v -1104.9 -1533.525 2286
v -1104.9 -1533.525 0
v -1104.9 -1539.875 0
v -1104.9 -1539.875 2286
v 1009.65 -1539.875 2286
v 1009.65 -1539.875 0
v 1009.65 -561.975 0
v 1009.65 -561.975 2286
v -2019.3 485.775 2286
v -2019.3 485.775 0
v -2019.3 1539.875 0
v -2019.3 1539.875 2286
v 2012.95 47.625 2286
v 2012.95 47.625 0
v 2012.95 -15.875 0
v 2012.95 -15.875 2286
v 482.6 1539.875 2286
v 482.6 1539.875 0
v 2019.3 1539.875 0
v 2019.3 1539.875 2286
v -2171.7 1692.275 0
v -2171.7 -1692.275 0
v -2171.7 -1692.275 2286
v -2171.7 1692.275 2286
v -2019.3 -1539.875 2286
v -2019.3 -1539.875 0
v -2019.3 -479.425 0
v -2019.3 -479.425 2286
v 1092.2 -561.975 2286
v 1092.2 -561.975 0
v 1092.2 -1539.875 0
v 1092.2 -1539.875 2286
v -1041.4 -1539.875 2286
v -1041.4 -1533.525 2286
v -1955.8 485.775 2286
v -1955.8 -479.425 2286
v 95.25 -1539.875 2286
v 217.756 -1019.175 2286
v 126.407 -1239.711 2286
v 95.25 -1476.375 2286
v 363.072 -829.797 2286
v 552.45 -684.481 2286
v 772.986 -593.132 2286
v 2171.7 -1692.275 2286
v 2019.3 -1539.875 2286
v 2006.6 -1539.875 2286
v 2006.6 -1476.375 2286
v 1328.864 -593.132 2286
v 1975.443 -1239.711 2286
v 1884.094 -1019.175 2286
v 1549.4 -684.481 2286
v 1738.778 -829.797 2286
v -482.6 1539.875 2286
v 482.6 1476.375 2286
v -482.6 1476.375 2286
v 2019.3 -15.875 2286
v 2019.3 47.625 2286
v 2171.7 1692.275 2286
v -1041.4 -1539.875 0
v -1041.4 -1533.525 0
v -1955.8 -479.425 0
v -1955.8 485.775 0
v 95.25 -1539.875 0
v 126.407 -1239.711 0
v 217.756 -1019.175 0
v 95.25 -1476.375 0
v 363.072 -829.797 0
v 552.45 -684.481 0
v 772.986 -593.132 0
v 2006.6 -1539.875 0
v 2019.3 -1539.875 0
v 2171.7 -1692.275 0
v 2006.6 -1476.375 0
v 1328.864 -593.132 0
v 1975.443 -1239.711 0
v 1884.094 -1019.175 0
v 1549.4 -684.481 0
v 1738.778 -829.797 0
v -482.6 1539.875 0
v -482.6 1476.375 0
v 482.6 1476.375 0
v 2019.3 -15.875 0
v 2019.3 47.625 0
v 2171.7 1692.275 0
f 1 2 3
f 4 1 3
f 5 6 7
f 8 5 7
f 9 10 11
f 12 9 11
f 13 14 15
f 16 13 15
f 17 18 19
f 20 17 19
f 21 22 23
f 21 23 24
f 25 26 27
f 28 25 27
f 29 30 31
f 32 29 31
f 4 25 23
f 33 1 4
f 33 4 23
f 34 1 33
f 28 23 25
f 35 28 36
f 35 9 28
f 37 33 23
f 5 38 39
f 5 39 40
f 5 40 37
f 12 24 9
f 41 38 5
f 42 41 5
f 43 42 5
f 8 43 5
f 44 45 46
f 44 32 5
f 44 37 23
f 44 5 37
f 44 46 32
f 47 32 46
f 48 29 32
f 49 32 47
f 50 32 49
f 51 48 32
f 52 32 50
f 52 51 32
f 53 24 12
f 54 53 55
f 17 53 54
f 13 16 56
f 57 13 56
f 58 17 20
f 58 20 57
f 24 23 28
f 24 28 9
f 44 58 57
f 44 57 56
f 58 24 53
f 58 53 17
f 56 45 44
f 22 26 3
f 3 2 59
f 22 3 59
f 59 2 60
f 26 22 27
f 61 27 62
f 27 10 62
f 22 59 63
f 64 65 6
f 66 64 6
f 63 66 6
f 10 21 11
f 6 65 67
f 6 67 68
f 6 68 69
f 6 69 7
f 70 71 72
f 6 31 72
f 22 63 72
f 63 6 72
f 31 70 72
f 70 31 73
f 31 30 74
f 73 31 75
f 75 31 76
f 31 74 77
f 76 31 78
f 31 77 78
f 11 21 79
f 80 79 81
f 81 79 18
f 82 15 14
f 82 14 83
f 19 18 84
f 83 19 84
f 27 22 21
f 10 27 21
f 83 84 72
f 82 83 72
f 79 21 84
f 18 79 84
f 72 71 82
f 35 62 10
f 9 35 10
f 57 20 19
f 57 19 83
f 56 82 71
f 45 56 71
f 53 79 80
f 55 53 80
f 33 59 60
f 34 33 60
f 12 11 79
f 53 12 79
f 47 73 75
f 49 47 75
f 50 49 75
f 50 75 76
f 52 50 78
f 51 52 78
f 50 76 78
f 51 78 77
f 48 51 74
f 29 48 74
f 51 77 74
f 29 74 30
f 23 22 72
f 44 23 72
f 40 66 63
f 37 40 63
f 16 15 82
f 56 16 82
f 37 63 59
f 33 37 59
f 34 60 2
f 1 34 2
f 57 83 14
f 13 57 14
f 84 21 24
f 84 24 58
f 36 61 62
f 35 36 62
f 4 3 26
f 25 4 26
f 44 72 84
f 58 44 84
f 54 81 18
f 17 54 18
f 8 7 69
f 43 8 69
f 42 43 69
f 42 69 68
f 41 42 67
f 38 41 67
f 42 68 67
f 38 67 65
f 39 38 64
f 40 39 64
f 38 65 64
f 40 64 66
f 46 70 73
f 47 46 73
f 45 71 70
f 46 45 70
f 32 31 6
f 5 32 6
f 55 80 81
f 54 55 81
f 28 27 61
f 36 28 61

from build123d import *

# Parameters (mm, degrees)
F0_W     = 4343.4
F0_H     = 3384.55
F1_DEPTH = 2286


with BuildPart() as f1:
    # F0 (on Top) → F1 (new body)
    with BuildSketch(Plane.XY):
        Rectangle(F0_W, F0_H)
        with BuildLine():
            Line((-2019.3, 485.775), (-2019.3, 1539.875))
            Line((-2019.3, 1539.875), (-482.6, 1539.875))
            Line((-482.6, 1539.875), (-482.6, 1476.375))
            Line((-482.6, 1476.375), (482.6, 1476.375))
            Line((482.6, 1476.375), (482.6, 1539.875))
            Line((482.6, 1539.875), (2019.3, 1539.875))
            Line((2019.3, 1539.875), (2019.3, 47.625))
            Line((2019.3, 47.625), (2012.95, 47.625))
            Line((2012.95, 47.625), (2012.95, -15.875))
            Line((2012.95, -15.875), (2019.3, -15.875))
            Line((2019.3, -15.875), (2019.3, -1539.875))
            Line((2019.3, -1539.875), (2006.6, -1539.875))
            Line((2006.6, -1539.875), (2006.6, -1476.375))
            ThreePointArc((2006.6, -1476.375), (1738.778441, -829.796559), (1092.2, -561.975))
            Line((1092.2, -561.975), (1092.2, -1476.375))
            Line((1092.2, -1476.375), (1092.2, -1539.875))
            Line((1092.2, -1539.875), (1009.65, -1539.875))
            Line((1009.65, -1539.875), (1009.65, -1476.375))
            Line((1009.65, -1476.375), (1009.65, -561.975))
            ThreePointArc((1009.65, -561.975), (363.071559, -829.796559), (95.25, -1476.375))
            Line((95.25, -1476.375), (95.25, -1539.875))
            Line((95.25, -1539.875), (-1041.4, -1539.875))
            Line((-1041.4, -1539.875), (-1041.4, -1533.525))
            Line((-1041.4, -1533.525), (-1104.9, -1533.525))
            Line((-1104.9, -1533.525), (-1104.9, -1539.875))
            Line((-1104.9, -1539.875), (-2019.3, -1539.875))
            Line((-2019.3, -1539.875), (-2019.3, -479.425))
            Line((-2019.3, -479.425), (-1955.8, -479.425))
            Line((-1955.8, -479.425), (-1955.8, 485.775))
            Line((-1955.8, 485.775), (-2019.3, 485.775))
        make_face(mode=Mode.SUBTRACT)
    extrude(amount=F1_DEPTH)


solid = f1.part
